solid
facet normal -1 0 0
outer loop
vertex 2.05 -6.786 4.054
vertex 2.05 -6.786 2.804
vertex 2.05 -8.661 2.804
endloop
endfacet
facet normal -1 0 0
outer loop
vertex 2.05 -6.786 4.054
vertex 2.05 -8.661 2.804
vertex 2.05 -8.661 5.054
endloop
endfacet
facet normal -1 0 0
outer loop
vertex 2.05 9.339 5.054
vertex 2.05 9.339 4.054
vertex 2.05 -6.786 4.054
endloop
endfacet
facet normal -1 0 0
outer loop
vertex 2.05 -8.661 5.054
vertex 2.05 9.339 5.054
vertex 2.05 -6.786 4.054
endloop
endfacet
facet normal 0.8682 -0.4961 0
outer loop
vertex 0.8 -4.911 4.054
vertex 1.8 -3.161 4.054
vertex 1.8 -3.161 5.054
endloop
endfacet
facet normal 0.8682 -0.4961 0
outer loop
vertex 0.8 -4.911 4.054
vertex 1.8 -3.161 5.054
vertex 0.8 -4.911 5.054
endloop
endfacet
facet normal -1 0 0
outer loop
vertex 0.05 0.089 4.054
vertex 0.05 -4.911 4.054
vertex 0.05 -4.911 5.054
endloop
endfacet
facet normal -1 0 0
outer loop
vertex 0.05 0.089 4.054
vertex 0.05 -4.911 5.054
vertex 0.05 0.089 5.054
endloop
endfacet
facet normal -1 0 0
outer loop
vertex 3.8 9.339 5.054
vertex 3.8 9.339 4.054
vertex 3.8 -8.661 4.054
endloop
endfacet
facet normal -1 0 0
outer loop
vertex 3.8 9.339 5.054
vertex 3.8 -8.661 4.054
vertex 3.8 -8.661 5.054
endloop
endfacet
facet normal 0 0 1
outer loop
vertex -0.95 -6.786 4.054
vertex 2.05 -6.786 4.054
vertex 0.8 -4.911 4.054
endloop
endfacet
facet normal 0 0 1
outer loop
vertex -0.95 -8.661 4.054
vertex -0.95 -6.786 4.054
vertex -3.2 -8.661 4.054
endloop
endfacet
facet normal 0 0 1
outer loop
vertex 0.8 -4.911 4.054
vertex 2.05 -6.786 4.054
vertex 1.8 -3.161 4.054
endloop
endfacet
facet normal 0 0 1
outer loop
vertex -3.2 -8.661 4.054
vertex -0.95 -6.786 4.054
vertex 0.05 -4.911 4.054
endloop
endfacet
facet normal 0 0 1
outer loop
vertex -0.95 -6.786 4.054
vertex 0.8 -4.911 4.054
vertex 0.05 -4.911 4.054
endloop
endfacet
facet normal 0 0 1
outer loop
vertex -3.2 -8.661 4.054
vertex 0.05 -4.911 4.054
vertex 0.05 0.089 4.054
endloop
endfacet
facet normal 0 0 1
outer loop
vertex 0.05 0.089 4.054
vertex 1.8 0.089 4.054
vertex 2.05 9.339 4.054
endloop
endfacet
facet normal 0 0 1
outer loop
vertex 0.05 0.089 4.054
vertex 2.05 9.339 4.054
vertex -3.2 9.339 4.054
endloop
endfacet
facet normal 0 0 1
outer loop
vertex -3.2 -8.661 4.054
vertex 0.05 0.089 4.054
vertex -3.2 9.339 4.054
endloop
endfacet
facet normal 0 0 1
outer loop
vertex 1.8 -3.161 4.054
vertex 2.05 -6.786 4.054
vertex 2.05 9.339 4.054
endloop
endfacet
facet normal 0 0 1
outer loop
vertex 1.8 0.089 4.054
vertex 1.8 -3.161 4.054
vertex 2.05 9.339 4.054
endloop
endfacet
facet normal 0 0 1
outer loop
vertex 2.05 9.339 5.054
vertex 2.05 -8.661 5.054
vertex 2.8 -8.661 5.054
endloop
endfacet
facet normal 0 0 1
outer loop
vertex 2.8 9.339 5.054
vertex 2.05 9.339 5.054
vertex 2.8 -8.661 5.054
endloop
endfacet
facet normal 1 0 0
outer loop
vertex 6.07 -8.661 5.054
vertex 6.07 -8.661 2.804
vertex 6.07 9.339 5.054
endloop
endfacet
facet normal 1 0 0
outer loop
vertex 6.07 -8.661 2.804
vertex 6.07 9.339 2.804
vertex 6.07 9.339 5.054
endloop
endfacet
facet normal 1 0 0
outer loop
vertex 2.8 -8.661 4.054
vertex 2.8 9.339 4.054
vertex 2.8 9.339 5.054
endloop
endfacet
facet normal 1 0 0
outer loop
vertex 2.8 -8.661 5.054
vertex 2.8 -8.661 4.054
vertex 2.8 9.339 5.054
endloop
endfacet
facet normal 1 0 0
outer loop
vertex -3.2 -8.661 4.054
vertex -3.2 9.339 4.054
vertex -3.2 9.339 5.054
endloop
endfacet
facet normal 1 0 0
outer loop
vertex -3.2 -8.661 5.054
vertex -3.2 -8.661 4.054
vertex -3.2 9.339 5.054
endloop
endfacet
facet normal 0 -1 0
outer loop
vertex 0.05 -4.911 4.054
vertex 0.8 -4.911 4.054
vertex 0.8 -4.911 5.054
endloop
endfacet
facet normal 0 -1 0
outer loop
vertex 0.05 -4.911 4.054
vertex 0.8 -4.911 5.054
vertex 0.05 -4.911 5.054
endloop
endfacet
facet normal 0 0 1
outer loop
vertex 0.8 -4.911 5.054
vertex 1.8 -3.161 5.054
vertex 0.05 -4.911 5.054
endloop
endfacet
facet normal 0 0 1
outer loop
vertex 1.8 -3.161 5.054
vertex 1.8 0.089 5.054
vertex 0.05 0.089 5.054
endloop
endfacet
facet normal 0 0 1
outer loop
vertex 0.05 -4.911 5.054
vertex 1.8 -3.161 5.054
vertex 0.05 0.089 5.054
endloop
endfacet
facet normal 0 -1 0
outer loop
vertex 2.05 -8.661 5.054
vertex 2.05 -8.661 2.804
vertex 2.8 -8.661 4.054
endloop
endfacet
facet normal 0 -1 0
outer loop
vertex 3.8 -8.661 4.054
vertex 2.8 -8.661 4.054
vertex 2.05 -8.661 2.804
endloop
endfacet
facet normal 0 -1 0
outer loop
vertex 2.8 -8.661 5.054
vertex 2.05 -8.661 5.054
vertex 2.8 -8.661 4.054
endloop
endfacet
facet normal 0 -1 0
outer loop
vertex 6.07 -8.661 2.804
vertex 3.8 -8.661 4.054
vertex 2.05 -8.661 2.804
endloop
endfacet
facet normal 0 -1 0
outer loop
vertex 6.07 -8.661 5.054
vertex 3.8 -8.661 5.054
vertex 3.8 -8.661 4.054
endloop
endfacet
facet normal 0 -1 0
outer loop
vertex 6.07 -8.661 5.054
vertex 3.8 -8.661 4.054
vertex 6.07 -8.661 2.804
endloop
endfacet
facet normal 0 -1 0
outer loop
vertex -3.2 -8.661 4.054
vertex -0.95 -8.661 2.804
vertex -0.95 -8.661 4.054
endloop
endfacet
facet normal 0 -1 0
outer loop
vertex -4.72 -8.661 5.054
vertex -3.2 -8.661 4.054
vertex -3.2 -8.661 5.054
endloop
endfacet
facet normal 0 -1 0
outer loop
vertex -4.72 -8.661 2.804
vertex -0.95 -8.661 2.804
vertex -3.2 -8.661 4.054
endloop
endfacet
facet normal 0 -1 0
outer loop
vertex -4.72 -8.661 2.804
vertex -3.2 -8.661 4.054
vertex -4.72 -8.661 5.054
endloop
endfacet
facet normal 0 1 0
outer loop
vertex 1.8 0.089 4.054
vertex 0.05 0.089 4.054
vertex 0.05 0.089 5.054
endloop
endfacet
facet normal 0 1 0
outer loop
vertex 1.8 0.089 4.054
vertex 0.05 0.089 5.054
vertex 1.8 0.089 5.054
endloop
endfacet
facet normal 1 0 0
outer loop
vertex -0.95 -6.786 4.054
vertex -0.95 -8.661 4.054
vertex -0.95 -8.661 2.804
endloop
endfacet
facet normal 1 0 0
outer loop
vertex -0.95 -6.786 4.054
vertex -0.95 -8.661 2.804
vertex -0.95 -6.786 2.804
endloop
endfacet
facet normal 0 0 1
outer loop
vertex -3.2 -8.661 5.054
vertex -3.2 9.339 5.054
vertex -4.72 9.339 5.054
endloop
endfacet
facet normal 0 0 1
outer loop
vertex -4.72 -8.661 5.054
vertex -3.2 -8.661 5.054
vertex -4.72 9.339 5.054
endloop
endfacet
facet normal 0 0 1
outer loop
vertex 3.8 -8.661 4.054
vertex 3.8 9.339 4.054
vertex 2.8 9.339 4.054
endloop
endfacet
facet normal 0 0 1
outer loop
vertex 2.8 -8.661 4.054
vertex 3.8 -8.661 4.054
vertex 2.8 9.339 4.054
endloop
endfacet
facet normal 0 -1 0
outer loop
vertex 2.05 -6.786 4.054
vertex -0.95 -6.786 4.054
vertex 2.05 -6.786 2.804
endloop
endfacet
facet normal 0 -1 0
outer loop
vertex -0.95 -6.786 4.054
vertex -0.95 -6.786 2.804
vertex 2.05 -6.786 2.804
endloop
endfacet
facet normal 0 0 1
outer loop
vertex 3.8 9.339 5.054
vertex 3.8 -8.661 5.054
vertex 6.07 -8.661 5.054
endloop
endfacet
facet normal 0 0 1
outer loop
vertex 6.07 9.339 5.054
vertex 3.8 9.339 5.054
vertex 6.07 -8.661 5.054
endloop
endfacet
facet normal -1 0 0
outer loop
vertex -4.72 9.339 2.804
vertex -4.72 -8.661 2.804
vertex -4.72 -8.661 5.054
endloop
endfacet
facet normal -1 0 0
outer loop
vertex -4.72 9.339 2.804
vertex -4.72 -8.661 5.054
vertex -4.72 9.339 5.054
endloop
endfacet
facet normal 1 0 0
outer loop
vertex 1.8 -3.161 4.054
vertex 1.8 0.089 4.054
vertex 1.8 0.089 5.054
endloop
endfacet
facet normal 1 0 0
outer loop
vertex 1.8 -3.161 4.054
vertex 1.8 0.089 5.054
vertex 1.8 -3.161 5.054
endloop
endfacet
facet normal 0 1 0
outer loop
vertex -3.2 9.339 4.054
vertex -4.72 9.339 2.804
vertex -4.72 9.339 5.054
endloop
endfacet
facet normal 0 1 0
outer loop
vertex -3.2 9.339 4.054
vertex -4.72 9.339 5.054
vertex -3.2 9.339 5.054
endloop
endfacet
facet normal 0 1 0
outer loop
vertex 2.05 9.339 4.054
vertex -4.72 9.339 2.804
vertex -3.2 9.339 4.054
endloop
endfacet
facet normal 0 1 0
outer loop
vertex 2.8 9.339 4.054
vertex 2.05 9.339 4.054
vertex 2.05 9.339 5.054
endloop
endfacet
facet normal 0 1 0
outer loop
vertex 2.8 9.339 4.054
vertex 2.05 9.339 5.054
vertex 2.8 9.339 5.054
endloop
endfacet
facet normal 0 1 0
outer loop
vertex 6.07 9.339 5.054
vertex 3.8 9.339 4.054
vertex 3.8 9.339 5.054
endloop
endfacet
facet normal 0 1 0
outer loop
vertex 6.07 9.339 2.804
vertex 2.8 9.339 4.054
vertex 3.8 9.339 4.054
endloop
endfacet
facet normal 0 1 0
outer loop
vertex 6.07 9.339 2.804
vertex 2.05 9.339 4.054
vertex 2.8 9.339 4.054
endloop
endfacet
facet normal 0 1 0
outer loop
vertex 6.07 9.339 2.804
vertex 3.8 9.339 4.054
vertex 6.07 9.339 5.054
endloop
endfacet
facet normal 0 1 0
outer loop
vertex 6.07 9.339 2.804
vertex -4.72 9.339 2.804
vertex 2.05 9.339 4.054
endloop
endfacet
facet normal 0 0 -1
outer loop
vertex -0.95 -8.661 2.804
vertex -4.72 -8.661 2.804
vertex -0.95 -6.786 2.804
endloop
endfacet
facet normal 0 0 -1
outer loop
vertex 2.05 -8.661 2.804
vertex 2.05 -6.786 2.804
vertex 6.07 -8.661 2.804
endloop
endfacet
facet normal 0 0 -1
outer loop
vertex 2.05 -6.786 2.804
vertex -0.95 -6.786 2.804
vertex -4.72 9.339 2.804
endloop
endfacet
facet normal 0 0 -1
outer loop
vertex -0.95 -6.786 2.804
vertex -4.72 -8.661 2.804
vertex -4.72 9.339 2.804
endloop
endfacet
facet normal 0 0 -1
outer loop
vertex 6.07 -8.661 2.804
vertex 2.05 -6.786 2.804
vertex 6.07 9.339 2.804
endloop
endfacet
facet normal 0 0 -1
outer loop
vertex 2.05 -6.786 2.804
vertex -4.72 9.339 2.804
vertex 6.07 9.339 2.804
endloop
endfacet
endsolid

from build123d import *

# Parameters (mm, degrees)
SKETCH1_W           = 43.16
SKETCH1_H           = 72
BOSS_EXTRUDE1_DEPTH = 9
SKETCH2_W           = 37.08
SKETCH2_H           = 4
CUT_EXTRUDE1_DEPTH  = 73
SKETCH3_W           = 28.08
SKETCH3_H           = 7.5
CUT_EXTRUDE2_DEPTH  = 6
SKETCH4_W           = 16.08
SKETCH4_H           = 64.5
BOSS_EXTRUDE2_DEPTH = 4
SKETCH5_W           = 16.08
SKETCH5_H           = 9
BOSS_EXTRUDE3_DEPTH = 7.5
SKETCH6_W           = 4
SKETCH6_H           = 4
CUT_EXTRUDE3_DEPTH  = 73
BOSS_EXTRUDE4_DEPTH = 4
SCALE1_SCALE        = 0.25


with BuildPart() as part:
    # Sketch1 → Boss-Extrude1 (new body)
    with BuildSketch(Plane(origin=(0, 0, 0), x_dir=(-1, 0, 0), z_dir=(0, 0, -1))):
        Rectangle(SKETCH1_W, SKETCH1_H)
    extrude(amount=-BOSS_EXTRUDE1_DEPTH)

    # Sketch2 → Cut-Extrude1 (cut, through all)
    with BuildSketch(Plane(origin=(0, 36, 0), x_dir=(-1, 0, 0), z_dir=(0, 1, 0))):
        with Locations((-3.04, 7)):
            Rectangle(SKETCH2_W, SKETCH2_H)
    extrude(amount=-CUT_EXTRUDE1_DEPTH, mode=Mode.SUBTRACT)

    # Sketch3 → Cut-Extrude2 (cut, through all)
    with BuildSketch(Plane.XY.offset(5)):
        with Locations((7.54, -32.25)):
            Rectangle(SKETCH3_W, SKETCH3_H)
    extrude(amount=-CUT_EXTRUDE2_DEPTH, mode=Mode.SUBTRACT)

    # Sketch4 → Boss-Extrude2 (add)
    with BuildSketch(Plane.XY.offset(5)):
        with Locations((13.54, 3.75)):
            Rectangle(SKETCH4_W, SKETCH4_H)
    extrude(amount=BOSS_EXTRUDE2_DEPTH)

    # Sketch5 → Boss-Extrude3 (add)
    with BuildSketch(Plane.XZ.offset(28.5)):
        with Locations((13.54, 4.5)):
            Rectangle(SKETCH5_W, SKETCH5_H)
    extrude(amount=BOSS_EXTRUDE3_DEPTH)

    # Sketch6 → Cut-Extrude3 (cut, through all)
    with BuildSketch(Plane(origin=(0, 36, 0), x_dir=(-1, 0, 0), z_dir=(0, 1, 0))):
        with Locations((-10.5, 7)):
            Rectangle(SKETCH6_W, SKETCH6_H)
    extrude(amount=-CUT_EXTRUDE3_DEPTH, mode=Mode.SUBTRACT)

    # Sketch7 → Boss-Extrude4 (add)
    with BuildSketch(Plane.XY.offset(5)):
        Polygon((-2.5, -1), (4.5, -1), (4.5, -14), (0.5, -21), (-2.5, -21), align=None)
    extrude(amount=BOSS_EXTRUDE4_DEPTH)


with BuildPart() as part_1:
    # Scale1: scaled about (0.900583751, 0.451348466, 3.739254469)
    add(part.part.scale(SCALE1_SCALE).moved(Location((0.675437813, 0.33851135, 2.804440852))))


solid = part_1.part
